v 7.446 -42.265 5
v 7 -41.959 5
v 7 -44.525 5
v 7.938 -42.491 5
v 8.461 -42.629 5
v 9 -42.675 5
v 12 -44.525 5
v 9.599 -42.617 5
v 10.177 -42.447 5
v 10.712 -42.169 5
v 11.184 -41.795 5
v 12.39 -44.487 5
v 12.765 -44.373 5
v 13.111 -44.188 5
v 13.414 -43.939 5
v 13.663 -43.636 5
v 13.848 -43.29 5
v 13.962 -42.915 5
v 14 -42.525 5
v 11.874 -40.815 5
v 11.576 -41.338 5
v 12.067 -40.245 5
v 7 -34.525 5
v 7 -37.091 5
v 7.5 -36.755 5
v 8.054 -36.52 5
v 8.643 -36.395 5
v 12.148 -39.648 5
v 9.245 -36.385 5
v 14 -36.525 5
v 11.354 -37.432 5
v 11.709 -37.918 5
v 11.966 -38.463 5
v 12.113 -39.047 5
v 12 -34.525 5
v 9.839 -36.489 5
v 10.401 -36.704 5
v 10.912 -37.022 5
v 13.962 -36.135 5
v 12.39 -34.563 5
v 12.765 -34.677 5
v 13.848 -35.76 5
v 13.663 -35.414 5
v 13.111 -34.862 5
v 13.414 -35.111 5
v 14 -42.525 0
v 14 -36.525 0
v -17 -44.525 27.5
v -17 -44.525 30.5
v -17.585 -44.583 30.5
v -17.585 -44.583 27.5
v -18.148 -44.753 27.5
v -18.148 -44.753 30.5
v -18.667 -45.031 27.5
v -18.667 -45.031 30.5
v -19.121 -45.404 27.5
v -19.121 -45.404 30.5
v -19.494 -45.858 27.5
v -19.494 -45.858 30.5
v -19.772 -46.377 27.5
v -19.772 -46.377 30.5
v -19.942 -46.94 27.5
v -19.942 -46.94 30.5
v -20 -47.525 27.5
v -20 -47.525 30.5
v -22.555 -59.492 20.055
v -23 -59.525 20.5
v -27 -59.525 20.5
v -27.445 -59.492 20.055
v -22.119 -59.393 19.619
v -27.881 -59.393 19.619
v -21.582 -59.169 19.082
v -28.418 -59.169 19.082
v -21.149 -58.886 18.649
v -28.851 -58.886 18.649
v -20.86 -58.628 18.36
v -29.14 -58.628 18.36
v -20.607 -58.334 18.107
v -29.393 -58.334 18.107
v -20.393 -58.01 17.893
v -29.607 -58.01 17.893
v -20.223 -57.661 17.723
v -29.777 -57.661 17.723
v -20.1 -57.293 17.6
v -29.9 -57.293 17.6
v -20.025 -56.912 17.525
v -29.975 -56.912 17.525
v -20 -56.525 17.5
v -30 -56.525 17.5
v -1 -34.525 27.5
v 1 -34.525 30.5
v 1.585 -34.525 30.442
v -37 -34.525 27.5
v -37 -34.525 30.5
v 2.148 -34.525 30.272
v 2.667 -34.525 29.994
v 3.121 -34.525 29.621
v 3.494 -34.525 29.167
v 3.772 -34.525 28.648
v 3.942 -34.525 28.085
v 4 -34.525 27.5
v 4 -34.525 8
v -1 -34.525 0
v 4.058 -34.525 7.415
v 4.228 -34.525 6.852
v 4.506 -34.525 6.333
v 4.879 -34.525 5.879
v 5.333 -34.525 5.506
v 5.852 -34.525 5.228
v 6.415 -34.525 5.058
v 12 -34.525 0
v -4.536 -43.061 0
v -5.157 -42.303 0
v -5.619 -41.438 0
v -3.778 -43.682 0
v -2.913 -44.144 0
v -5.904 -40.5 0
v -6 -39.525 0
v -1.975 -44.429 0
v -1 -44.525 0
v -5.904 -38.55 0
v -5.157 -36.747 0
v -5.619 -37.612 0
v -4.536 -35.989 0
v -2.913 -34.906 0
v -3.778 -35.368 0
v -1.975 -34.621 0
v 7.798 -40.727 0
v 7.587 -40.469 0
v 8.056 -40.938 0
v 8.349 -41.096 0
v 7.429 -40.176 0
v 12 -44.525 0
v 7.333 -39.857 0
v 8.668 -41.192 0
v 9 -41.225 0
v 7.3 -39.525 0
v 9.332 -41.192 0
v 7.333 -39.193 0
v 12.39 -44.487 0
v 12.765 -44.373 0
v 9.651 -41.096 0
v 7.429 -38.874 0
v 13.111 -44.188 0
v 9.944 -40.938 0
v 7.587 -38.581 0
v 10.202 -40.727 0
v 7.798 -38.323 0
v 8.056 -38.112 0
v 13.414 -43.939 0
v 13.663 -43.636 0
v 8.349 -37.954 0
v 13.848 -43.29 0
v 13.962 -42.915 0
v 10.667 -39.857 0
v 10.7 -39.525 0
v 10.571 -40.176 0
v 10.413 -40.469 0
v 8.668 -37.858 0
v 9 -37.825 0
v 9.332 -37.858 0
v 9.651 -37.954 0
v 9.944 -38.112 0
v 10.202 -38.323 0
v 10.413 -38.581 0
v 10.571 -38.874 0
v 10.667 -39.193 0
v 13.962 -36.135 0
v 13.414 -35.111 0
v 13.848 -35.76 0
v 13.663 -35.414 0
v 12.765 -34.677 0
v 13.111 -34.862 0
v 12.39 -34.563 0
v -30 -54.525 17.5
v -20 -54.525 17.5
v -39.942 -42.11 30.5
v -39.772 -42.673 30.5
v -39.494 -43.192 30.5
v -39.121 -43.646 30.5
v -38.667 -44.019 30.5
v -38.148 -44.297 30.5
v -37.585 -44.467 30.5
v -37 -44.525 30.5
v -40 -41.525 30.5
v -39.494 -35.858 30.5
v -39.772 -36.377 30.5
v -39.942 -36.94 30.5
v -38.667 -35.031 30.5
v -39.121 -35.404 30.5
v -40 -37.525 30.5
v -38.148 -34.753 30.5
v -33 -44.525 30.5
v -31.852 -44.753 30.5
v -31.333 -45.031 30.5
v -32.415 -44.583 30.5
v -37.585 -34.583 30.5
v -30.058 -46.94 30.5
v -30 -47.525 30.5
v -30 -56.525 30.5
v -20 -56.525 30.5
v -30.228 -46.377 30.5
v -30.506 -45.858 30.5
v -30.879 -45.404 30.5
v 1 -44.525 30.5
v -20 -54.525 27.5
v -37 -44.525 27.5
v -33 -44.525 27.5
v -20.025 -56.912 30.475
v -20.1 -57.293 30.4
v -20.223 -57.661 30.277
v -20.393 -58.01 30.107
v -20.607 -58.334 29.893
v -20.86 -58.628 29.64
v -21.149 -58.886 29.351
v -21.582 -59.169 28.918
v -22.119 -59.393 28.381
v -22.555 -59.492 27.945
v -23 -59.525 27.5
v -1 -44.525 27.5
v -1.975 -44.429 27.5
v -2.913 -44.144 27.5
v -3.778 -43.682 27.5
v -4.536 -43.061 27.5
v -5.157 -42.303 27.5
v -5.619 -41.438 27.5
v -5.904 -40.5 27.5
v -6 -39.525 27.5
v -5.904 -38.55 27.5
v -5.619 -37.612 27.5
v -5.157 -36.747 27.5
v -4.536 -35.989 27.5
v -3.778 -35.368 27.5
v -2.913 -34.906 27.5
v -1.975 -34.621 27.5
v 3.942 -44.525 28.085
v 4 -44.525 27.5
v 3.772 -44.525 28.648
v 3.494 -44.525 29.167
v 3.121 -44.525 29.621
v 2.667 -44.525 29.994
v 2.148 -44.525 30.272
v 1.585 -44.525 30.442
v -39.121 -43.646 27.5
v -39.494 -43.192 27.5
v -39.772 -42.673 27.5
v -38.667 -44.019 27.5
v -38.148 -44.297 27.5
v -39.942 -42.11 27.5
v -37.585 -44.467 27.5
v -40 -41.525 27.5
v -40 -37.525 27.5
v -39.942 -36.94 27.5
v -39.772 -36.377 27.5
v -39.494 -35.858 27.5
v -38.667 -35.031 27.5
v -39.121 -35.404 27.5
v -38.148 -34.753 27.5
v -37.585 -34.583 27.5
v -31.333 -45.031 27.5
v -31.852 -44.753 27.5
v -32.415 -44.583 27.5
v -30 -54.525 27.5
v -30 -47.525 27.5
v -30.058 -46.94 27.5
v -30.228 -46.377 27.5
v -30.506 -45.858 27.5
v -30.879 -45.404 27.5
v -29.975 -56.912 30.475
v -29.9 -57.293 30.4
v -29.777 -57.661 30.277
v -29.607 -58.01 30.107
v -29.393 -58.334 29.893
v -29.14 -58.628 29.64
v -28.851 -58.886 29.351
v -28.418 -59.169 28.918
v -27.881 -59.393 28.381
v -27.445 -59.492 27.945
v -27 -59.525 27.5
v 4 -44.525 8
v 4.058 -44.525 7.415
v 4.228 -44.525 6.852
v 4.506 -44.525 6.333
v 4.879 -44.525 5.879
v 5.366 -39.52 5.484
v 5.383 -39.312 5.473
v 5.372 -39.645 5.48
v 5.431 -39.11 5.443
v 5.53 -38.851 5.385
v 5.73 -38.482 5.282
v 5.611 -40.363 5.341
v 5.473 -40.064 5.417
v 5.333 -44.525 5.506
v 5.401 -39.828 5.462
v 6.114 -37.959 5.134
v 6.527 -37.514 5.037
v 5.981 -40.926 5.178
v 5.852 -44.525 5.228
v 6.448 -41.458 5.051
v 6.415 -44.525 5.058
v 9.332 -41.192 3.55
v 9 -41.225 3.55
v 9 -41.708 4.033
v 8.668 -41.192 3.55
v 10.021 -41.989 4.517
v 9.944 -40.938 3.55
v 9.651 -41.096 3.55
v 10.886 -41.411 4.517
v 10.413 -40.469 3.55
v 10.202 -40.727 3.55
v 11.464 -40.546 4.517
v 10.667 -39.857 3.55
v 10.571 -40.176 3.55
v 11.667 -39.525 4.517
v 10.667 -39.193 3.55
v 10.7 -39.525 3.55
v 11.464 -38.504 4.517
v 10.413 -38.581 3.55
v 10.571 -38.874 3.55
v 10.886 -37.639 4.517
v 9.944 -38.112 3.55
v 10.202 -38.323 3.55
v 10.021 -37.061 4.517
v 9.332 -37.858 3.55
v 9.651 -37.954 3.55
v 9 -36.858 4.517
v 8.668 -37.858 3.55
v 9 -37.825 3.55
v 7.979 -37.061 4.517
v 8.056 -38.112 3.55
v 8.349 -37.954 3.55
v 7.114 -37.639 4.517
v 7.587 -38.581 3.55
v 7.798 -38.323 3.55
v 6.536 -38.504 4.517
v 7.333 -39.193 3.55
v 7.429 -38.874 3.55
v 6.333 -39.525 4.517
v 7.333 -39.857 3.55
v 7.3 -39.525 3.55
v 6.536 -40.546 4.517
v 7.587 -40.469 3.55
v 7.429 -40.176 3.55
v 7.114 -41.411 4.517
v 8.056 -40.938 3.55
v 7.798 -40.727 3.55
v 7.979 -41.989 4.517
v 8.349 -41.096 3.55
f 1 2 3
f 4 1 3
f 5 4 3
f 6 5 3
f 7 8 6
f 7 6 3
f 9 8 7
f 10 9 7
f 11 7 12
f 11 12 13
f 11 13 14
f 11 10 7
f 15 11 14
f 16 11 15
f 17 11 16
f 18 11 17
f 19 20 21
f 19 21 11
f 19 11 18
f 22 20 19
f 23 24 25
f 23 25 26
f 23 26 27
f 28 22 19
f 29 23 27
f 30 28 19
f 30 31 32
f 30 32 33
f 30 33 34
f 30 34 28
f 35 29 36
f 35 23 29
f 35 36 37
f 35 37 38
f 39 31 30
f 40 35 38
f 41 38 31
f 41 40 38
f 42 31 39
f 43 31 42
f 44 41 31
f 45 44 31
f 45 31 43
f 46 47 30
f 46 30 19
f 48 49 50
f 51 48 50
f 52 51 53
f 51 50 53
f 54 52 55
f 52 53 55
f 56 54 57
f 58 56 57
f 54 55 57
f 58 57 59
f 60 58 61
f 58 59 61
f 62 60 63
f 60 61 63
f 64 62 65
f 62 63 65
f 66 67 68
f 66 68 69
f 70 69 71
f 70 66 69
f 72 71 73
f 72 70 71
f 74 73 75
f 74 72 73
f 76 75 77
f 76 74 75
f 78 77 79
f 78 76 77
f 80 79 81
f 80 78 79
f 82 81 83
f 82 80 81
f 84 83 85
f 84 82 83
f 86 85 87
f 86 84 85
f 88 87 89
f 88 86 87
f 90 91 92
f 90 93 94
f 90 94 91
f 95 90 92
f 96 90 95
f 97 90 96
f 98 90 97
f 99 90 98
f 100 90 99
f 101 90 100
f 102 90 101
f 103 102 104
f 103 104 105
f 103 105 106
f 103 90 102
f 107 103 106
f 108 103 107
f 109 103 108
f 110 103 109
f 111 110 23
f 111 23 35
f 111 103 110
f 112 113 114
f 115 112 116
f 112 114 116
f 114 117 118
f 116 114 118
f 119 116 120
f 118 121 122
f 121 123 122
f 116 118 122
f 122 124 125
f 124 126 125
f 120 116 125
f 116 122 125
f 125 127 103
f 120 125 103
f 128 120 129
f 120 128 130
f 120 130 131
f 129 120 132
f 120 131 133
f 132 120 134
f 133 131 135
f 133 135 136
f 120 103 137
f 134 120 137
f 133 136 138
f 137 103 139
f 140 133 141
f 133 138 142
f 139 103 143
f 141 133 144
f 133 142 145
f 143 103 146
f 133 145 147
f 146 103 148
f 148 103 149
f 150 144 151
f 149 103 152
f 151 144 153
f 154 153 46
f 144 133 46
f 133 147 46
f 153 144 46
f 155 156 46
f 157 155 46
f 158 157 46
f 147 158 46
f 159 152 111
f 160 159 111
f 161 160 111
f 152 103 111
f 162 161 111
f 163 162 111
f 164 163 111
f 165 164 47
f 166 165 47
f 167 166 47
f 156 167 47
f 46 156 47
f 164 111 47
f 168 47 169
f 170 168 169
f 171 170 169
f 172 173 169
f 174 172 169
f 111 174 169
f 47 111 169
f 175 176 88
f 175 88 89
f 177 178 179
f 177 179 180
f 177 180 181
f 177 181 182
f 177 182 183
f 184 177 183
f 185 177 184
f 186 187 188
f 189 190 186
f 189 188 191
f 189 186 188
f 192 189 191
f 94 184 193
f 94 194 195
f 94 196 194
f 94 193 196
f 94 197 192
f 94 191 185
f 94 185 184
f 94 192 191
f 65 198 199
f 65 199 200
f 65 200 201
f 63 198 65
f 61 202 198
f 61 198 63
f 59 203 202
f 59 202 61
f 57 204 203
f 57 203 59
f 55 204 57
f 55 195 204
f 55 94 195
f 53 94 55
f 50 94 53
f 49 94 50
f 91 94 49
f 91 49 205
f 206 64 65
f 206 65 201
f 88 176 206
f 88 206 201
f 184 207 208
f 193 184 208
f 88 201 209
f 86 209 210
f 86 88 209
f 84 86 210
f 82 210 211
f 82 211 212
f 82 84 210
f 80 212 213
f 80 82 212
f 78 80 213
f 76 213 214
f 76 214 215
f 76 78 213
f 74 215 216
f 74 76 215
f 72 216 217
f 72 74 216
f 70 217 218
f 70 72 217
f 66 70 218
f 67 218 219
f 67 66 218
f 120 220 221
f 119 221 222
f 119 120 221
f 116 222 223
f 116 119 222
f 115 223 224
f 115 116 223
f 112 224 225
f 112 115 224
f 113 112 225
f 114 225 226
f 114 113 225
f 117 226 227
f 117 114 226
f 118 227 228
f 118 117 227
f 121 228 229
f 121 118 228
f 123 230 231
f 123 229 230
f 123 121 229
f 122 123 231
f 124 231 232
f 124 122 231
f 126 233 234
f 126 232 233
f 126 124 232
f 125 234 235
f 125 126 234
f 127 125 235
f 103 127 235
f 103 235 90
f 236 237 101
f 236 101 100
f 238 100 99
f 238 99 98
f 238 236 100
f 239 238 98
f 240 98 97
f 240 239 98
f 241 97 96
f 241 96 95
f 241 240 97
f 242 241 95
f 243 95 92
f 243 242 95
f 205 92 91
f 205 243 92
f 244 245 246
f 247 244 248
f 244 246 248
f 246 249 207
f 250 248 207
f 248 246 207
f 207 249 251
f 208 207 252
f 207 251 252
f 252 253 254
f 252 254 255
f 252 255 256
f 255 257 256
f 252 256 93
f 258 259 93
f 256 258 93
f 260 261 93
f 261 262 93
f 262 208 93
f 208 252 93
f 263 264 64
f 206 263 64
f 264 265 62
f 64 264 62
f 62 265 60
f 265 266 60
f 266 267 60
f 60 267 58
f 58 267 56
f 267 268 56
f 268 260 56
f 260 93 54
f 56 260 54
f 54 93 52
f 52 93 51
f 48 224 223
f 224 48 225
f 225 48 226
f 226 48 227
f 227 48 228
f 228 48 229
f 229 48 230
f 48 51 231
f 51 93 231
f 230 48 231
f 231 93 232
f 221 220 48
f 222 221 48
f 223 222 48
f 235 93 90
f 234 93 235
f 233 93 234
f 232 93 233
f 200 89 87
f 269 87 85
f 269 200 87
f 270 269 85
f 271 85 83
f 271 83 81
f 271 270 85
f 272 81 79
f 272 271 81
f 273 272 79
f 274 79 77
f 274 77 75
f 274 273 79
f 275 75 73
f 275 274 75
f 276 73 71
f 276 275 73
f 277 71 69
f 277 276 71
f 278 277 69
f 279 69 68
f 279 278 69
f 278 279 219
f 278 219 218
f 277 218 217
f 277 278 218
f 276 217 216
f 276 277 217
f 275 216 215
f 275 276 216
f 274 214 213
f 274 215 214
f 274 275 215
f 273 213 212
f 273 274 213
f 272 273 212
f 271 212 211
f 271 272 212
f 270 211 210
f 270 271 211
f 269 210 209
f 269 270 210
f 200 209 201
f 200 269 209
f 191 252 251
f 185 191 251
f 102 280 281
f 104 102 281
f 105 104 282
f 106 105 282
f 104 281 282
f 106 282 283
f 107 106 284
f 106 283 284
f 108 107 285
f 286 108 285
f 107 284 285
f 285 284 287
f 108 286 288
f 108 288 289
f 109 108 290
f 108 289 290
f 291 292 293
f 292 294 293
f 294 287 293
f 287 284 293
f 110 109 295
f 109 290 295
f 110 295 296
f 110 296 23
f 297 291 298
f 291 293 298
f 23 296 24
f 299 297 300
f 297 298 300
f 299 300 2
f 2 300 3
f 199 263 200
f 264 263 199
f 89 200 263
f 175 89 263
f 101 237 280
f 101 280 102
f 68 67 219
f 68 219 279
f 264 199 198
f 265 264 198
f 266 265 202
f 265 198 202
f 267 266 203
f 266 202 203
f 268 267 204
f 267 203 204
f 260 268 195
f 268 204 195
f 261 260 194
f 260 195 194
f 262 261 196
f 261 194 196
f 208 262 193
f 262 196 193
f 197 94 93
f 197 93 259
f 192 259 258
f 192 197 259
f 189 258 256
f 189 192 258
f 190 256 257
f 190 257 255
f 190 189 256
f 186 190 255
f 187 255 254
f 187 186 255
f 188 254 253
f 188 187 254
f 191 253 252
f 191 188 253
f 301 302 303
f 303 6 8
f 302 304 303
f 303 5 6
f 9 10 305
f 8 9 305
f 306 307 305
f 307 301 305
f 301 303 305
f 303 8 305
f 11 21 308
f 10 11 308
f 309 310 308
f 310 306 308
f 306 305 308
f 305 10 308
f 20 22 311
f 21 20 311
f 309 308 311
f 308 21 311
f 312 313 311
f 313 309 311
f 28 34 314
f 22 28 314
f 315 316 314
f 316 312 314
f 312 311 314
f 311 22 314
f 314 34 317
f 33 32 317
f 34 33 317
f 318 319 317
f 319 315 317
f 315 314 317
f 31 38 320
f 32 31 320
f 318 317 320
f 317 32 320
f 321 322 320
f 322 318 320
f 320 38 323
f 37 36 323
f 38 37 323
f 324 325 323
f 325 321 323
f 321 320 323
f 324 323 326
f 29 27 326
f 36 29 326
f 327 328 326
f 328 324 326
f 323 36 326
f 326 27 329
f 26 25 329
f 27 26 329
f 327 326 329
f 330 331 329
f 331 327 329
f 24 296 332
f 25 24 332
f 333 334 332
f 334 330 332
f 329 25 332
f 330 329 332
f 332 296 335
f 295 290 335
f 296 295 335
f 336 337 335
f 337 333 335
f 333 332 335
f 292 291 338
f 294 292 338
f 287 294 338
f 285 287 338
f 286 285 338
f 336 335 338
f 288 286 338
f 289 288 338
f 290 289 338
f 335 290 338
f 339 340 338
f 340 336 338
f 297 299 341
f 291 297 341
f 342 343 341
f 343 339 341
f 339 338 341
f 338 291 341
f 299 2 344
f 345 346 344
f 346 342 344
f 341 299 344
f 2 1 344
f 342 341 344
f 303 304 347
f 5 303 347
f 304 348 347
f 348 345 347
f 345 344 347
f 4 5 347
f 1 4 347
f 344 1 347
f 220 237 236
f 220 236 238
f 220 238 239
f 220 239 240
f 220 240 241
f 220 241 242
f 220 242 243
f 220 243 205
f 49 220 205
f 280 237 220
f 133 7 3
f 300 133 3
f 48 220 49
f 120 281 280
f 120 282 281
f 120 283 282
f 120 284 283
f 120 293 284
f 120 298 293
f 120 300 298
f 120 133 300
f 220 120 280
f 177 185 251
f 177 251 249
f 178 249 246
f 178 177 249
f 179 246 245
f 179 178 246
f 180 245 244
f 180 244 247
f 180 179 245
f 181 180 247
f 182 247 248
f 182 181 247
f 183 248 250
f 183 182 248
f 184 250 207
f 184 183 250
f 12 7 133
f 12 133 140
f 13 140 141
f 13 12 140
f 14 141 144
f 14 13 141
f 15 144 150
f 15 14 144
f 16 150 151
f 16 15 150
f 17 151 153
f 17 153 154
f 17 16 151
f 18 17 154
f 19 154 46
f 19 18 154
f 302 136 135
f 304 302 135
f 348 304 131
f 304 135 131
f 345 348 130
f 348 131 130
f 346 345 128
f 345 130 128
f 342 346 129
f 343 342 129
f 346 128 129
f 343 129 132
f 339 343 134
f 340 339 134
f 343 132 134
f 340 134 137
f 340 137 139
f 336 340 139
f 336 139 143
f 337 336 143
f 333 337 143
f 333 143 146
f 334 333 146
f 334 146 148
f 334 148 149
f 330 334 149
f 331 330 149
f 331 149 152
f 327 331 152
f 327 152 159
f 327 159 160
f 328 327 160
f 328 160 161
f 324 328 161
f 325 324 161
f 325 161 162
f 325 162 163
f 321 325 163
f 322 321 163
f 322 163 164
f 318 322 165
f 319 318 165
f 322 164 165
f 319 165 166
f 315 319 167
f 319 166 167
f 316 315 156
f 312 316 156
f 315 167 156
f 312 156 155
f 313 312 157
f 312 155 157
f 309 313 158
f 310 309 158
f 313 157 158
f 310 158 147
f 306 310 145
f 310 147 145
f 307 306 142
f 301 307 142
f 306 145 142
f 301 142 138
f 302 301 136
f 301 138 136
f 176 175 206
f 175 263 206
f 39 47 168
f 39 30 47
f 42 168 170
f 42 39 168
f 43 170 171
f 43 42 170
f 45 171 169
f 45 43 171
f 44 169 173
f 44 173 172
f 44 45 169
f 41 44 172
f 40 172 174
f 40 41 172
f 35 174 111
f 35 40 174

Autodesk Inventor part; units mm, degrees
ref_plane "YZ Plane" through (0, 0, 0) normal (1, 0, 0) x (0, 1, 0)
ref_plane "XZ Plane" through (0, 0, 0) normal (0, 1, 0) x (-1, 0, 0)
ref_plane "РабПлоскость1" through (0, 0, 0) normal (0, 0, 1) x (1, 0, 0)
sketch "Эскиз1" plane through (0, 0, 0) normal (0, 0, 1) x (1, 0, 0)
  line L0 (-6, -50.525) -> (-6, 46.475) projected
  arc A0 (-10, -54.525) -> (-6, -50.525) centre (-10, -50.525) ccw projected
  line L1 (-36, -54.525) -> (-10, -54.525) projected
  arc A1 (-40, -50.525) -> (-36, -54.525) centre (-36, -50.525) ccw projected
  line L2 (-40, 46.475) -> (-40, -50.525) projected
  circle A2 centre (-1, -39.525) radius 5
  line L3 (5, 13.475) -> (5, 17.5589) projected
  line L4 (14, -44.525) -> (4, -44.525)
  line L5 (4, -44.525) -> (4, -34.525)
  line L6 (4, -34.525) -> (14, -34.525)
  line L7 (14, -34.525) -> (14, -44.525)
  line L8 (4, -44.525) -> (-1, -44.525)
  line L9 (-1, -44.525) -> (-1, -34.525)
  line L10 (-1, -34.525) -> (4, -34.525)
  line L11 (4, -34.525) -> (4, -44.525)
  point P0 (0, 0)
  dimension "d0" = 10
  dimension "d1" = 10
  dimension "d2" = 5
  dimension "d3" = 10
  dimension "d4" = 15
  dimension "d5" = 20
extrude "Выдавливание1" add sketch "Эскиз1" along normal blind 5
sketch "Эскиз2" plane through (0, 0, 5) normal (0, 0, 1) x (1, 0, 0)
  line L0 (-1, -44.525) -> (14, -44.525) projected
  line L1 (14, -44.525) -> (14, -34.525) projected
  line L2 (14, -34.525) -> (-1, -34.525) projected
  arc A0 (-1, -34.525) -> (-1, -44.525) centre (-1, -39.525) ccw projected
  circle A1 centre (-1, -39.525) radius 5
  line L3 (-1, -44.525) -> (4, -44.525)
  line L4 (4, -44.525) -> (4, -34.525)
  line L5 (4, -34.525) -> (-1, -34.525)
  line L6 (-1, -34.525) -> (-1, -44.525)
  point P0 (0, 0)
  point P1 (4, -44.525)
  dimension "d8" = 10
extrude "Выдавливание2" add sketch "Эскиз2" along normal blind 22.5 contours A1 L4 L0 | L6 A1 | A0 L6 | L2 L4 A1
sketch "Эскиз3" plane through (0, 0, 27.5) normal (0, 0, 1) x (1, 0, 0)
  line L0 (-1, -44.525) -> (4, -44.525) projected
  line L1 (4, -44.525) -> (4, -34.525) projected
  line L2 (4, -34.525) -> (-1, -34.525) projected
  arc A0 (-1, -34.525) -> (-1, -44.525) centre (-1, -39.525) ccw projected
  line L3 (4, -34.525) -> (-40, -34.525)
  line L4 (-40, -34.525) -> (-40, -44.525)
  line L5 (-40, -44.525) -> (4, -44.525)
  line L6 (4, -44.525) -> (4, -34.525)
  line L7 (-40, 46.475) -> (-40, -50.525) projected
  line L8 (-30, -34.525) -> (-20, -34.525)
  line L9 (-20, -34.525) -> (-20, -59.525)
  line L10 (-20, -59.525) -> (-30, -59.525)
  line L11 (-30, -59.525) -> (-30, -34.525)
  line L12 (-36, -54.525) -> (-10, -54.525) projected
  point P0 (0, 0)
  point P1 (-1, -34.525)
  point P2 (-20, -44.525)
  point P3 (-30, -44.525)
  dimension "d11" = 0
  dimension "d12" = 10
  dimension "d24" = 10
  dimension "d25" = 10
  dimension "d26" = 5
extrude "Выдавливание3" add sketch "Эскиз3" along normal blind 3
sketch "Эскиз4" plane through (0, 0, 5) normal (0, 0, 1) x (1, 0, 0)
  line L0 (4, -34.525) -> (4, -44.525) projected
  line L1 (4, -44.525) -> (14, -44.525) projected
  line L2 (14, -44.525) -> (14, -34.525) projected
  line L3 (14, -34.525) -> (4, -34.525) projected
  circle A0 centre (9, -39.525) radius 1.6899
  point P0 (0, 0)
hole "Отверстие1" at (9, -39.525, 5) direction (0, 0, -1) diameter 3.4 end through all countersink diameter 6.3 countersink angle 90 clearance for "Винт с потайной головкой ISO 2009/7046" size "M3" standard "ISO"
fillet "Сопряжение1" radius 2 2 edges at (14, -34.525, 2.5) (14, -44.525, 2.5)
fillet "Сопряжение2" radius 3 2 edges at (4, -39.525, 5) (4, -39.525, 30.5)
sketch "Эскиз5" plane through (0, 0, 27.5) normal (0, 0, -1) x (-1, 0, 0)
  line L0 (30, -59.525) -> (20, -59.525) projected
  line L1 (30, -44.525) -> (30, -59.525) projected
  line L2 (20, -59.525) -> (30, -59.525)
  line L3 (30, -59.525) -> (30, -54.525)
  line L4 (30, -54.525) -> (20, -54.525)
  line L5 (20, -54.525) -> (20, -59.525)
  point P0 (0, 0)
  dimension "d27" = 5
extrude "Выдавливание4" add sketch "Эскиз5" along normal blind 10
fillet "Сопряжение3" radius 3 8 edges at (-20, -44.525, 29) (-30, -44.525, 29) (-40, -44.525, 29) (-40, -34.525, 29) (-20, -59.525, 24) (-30, -59.525, 24) (-25, -59.525, 30.5) (-25, -59.525, 17.5)
properties part number "FrontBracket" material "Пластик ПАЭК"
